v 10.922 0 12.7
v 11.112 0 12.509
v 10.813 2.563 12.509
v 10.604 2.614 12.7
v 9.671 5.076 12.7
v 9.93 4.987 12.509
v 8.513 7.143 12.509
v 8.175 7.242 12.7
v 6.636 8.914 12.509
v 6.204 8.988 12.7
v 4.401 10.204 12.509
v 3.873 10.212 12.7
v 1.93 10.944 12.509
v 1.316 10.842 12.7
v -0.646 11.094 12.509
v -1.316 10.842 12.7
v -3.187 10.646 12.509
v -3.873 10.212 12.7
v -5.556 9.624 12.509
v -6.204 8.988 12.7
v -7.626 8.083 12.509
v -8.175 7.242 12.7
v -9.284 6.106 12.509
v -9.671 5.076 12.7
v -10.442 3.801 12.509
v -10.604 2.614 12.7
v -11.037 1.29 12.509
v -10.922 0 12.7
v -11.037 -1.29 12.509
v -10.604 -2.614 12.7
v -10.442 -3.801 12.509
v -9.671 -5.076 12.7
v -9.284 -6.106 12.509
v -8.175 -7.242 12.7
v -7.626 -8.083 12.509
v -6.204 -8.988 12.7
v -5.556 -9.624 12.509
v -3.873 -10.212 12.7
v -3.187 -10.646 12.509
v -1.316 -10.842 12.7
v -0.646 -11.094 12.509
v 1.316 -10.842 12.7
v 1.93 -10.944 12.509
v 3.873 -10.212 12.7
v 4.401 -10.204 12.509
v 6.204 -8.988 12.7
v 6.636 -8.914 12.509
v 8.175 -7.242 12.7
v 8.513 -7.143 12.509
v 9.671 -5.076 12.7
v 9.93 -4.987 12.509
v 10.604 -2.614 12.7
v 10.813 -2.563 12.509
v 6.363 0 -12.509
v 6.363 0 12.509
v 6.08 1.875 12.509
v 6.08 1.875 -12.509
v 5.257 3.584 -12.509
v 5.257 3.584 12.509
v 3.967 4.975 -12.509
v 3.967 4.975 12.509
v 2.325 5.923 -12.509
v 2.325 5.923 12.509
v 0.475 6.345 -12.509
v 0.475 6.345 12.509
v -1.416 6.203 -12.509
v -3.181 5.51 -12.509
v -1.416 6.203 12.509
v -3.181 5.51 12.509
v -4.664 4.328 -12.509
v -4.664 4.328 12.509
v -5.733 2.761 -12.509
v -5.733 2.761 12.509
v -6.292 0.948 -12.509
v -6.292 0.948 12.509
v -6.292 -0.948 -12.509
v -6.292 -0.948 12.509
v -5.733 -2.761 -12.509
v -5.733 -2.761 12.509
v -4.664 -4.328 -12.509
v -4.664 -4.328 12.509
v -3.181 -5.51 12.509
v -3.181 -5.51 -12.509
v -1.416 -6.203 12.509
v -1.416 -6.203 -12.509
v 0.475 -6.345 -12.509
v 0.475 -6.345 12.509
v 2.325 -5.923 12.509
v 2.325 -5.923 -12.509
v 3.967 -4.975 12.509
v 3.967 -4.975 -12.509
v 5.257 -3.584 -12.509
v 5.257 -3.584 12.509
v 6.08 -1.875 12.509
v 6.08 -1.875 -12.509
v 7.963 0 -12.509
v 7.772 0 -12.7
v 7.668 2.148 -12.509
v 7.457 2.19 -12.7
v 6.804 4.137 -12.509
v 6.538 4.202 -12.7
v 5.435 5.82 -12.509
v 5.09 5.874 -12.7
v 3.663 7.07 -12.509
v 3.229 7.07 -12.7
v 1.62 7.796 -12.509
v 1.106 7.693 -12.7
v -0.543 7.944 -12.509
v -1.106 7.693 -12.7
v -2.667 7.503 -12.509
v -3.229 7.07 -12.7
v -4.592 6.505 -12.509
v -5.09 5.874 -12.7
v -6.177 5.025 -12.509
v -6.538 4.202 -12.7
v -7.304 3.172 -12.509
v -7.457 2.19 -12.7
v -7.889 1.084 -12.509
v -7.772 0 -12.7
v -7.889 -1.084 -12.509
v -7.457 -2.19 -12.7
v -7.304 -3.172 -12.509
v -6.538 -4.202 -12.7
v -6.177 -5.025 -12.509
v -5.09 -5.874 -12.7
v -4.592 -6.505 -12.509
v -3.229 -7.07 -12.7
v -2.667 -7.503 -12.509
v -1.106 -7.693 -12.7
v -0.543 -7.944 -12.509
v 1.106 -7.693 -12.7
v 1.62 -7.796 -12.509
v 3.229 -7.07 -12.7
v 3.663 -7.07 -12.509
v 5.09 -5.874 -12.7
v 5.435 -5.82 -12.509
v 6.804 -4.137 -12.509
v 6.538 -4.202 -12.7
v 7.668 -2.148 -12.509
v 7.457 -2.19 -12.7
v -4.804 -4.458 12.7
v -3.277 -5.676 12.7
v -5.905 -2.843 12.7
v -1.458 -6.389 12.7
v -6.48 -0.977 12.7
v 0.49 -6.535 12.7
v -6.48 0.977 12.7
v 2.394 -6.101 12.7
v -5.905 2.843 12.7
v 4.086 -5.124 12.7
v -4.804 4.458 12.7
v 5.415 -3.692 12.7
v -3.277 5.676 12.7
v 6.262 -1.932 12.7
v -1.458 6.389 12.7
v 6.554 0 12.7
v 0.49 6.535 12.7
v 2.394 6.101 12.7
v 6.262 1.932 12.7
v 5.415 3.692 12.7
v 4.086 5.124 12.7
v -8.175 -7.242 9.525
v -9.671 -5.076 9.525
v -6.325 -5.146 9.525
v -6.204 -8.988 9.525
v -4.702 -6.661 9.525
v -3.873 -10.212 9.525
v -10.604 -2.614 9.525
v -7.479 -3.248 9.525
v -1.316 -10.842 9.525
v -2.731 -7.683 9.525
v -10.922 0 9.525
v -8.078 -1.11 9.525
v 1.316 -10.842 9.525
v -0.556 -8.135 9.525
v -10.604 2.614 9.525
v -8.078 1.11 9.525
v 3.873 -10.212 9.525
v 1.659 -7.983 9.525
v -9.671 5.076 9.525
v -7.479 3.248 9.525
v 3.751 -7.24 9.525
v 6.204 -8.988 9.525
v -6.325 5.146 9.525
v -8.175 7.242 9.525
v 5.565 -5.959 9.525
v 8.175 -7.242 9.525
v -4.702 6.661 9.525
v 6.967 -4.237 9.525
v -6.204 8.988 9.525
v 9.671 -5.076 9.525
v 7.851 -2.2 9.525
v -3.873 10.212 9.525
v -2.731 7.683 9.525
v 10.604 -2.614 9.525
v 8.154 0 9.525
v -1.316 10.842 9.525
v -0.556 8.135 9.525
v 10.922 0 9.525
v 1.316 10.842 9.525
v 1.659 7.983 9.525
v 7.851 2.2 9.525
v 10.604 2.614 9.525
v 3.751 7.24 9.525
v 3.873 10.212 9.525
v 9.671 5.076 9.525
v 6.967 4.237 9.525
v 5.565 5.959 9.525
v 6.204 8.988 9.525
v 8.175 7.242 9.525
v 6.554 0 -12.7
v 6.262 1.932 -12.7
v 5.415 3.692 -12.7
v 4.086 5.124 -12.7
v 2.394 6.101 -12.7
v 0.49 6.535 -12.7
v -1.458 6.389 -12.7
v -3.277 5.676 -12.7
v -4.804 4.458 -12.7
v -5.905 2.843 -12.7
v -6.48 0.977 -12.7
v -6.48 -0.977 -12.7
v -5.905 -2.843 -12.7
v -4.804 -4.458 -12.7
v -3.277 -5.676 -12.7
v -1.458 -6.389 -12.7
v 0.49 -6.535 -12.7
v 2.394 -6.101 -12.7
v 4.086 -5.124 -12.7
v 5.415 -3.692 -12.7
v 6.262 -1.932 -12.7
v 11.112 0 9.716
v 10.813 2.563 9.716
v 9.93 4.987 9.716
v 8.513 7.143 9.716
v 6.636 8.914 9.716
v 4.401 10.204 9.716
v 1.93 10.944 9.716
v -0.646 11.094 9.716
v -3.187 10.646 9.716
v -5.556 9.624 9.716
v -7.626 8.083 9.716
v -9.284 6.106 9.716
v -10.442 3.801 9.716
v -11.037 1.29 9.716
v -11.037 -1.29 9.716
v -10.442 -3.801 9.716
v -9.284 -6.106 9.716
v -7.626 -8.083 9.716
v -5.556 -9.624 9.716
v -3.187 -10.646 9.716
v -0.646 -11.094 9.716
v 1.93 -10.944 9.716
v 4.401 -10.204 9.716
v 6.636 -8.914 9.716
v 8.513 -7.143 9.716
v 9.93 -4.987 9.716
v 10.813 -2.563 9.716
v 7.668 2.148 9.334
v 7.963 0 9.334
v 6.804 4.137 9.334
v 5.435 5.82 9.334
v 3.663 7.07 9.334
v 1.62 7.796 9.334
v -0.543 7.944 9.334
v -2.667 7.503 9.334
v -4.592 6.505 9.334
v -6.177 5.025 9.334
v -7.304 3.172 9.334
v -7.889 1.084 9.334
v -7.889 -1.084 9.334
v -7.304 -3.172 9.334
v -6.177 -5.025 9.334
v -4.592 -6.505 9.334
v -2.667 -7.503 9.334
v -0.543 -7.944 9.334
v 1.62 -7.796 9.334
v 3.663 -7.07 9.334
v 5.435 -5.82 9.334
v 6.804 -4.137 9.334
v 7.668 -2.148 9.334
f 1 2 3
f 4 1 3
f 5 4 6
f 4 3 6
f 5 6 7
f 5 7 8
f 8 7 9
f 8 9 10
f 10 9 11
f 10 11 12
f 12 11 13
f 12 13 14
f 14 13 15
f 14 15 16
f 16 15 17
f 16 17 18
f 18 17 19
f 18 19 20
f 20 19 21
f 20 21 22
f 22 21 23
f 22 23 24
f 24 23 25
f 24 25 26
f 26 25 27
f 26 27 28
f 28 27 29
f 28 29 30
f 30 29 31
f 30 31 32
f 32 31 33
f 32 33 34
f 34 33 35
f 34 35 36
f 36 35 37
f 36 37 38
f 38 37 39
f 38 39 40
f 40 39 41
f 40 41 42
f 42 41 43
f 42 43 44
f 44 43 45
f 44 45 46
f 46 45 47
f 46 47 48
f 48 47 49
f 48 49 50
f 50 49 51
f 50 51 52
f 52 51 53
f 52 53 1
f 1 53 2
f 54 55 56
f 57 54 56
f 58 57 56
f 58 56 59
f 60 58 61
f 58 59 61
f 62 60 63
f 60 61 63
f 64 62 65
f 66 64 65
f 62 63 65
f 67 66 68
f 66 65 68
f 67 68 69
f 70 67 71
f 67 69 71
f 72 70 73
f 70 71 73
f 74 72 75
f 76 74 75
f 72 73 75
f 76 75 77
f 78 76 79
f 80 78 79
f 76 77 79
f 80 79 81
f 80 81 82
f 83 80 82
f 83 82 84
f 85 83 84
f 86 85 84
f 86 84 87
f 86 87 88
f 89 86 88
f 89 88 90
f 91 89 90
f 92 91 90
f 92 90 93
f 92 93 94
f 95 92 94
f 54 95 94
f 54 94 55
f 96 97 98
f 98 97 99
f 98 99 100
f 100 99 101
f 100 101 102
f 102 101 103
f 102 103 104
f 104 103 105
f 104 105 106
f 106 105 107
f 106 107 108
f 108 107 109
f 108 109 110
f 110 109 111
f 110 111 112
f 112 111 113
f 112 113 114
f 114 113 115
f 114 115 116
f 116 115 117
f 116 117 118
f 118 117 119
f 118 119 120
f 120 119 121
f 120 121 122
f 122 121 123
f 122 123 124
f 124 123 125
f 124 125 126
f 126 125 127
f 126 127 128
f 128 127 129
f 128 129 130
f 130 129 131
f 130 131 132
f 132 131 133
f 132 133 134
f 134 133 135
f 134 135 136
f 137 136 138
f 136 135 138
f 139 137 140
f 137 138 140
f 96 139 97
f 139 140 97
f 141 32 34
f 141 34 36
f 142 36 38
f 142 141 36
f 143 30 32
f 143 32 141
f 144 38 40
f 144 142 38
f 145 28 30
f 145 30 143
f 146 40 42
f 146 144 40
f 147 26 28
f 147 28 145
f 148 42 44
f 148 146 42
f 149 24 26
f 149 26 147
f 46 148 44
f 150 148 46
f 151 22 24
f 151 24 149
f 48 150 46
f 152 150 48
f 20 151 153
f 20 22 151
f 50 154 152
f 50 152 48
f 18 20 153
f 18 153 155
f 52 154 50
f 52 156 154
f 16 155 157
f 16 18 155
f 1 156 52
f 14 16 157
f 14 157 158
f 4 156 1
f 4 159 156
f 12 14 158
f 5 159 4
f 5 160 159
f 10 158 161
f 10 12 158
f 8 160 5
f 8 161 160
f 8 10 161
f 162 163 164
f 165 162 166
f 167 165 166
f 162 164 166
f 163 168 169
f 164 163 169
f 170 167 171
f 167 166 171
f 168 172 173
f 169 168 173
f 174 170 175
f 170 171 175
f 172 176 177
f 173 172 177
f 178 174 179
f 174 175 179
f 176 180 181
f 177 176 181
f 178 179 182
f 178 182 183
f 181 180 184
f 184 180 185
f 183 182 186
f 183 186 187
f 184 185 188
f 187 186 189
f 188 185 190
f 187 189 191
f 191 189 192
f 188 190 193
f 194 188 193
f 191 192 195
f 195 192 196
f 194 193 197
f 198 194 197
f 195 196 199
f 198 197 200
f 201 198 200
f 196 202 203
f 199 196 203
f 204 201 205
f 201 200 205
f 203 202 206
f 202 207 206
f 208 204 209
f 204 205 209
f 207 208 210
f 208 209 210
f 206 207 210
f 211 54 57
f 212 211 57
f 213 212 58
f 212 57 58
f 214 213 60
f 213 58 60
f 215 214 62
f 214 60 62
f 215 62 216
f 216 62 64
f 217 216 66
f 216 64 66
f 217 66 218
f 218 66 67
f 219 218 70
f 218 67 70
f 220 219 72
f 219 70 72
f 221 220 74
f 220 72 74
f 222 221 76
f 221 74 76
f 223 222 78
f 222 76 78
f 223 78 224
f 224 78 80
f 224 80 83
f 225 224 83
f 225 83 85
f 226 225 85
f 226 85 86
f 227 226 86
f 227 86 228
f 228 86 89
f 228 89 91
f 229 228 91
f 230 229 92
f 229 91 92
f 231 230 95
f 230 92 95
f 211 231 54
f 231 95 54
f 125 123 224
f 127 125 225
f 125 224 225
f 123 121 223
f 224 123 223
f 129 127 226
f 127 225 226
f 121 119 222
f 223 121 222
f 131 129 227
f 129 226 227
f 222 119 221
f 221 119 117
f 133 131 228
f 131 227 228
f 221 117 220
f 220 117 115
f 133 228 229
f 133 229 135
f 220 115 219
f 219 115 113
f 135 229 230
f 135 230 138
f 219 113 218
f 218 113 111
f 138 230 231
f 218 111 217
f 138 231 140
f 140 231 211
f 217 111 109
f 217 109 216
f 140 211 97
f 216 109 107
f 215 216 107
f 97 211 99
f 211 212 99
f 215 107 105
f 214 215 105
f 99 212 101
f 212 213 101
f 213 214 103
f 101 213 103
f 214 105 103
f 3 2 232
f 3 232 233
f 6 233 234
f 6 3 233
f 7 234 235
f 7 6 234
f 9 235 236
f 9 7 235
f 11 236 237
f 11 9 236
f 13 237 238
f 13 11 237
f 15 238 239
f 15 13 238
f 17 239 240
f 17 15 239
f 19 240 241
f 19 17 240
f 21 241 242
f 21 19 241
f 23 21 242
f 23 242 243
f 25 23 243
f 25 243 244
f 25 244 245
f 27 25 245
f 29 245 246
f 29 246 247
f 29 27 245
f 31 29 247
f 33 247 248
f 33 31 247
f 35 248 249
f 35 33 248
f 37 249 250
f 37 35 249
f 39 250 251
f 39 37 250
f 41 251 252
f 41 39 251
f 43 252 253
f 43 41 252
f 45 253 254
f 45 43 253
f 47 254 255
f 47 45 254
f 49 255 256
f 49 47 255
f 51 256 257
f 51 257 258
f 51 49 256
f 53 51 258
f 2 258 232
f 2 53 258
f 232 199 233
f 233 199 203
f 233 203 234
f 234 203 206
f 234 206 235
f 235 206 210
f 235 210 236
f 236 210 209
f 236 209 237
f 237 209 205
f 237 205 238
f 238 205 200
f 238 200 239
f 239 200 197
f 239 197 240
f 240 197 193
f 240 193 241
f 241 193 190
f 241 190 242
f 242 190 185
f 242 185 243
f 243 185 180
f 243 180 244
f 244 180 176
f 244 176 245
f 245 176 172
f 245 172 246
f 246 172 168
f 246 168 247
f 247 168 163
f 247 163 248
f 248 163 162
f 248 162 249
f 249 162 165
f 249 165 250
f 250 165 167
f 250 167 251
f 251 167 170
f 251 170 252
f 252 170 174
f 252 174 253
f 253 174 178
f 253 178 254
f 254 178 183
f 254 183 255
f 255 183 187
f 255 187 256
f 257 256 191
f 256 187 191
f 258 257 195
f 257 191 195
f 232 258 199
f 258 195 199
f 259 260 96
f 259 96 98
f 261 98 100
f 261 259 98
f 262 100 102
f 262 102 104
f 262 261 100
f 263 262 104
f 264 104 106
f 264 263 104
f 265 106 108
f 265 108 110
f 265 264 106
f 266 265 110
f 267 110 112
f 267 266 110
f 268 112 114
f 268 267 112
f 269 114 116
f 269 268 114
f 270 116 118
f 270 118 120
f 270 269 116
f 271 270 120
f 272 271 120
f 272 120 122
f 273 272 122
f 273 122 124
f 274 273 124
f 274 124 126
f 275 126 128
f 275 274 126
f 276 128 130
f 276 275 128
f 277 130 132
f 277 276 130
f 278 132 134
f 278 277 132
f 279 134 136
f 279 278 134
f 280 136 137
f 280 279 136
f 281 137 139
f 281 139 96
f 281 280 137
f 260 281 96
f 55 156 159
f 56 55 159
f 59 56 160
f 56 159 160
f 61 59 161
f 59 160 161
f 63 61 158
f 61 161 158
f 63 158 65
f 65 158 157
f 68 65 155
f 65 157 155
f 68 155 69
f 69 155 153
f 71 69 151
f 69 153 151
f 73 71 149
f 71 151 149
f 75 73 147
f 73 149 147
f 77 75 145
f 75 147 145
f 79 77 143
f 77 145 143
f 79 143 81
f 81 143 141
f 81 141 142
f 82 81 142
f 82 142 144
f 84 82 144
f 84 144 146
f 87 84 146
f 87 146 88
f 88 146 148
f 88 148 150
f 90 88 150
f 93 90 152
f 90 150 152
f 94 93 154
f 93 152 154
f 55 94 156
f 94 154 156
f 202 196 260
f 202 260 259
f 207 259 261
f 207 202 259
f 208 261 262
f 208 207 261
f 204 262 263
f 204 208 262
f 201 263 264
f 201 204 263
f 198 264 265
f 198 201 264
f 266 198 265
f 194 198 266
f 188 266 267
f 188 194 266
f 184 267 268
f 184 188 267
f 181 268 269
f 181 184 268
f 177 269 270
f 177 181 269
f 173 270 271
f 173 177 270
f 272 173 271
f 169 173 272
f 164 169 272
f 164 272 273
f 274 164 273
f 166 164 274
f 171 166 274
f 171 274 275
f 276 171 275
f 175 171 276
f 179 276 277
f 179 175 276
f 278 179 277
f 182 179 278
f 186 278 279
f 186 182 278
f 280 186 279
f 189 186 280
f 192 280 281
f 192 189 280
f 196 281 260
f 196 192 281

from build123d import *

# Parameters (mm, degrees)
BOSS_EXTRUDE1_START = 12.7
SKETCH3_R           = 11.1125
SKETCH3_R_2         = 6.3627
BOSS_EXTRUDE1_DEPTH = 3.175
BOSS_EXTRUDE2_START = 9.525
SKETCH4_R           = 7.9629
SKETCH4_R_2         = 6.3627
BOSS_EXTRUDE2_DEPTH = 22.225
CHAMFER1_SIZE       = 0.190881


with BuildPart() as part:
    # Sketch3 → Boss-Extrude1 (new body)
    with BuildSketch(Plane.XY.offset(BOSS_EXTRUDE1_START)):
        Circle(SKETCH3_R)
        Circle(SKETCH3_R_2, mode=Mode.SUBTRACT)
    extrude(amount=-BOSS_EXTRUDE1_DEPTH)

    # Sketch4 → Boss-Extrude2 (add)
    with BuildSketch(Plane.XY.offset(BOSS_EXTRUDE2_START)):
        Circle(SKETCH4_R)
        Circle(SKETCH4_R_2, mode=Mode.SUBTRACT)
    extrude(amount=-BOSS_EXTRUDE2_DEPTH)

    # Chamfer1
    chamfer1_edges = [part.edges().sort_by_distance(p)[0] for p in [
        (-6.3627, 0, -12.7),
        (-7.9629, 0, 9.525),
        (-11.1125, 0, 12.7),
        (-11.1125, 0, 9.525),
        (-6.3627, 0, 12.7),
        (-7.9629, 0, -12.7),
    ]]
    chamfer(chamfer1_edges, length=CHAMFER1_SIZE)


solid = part.part
